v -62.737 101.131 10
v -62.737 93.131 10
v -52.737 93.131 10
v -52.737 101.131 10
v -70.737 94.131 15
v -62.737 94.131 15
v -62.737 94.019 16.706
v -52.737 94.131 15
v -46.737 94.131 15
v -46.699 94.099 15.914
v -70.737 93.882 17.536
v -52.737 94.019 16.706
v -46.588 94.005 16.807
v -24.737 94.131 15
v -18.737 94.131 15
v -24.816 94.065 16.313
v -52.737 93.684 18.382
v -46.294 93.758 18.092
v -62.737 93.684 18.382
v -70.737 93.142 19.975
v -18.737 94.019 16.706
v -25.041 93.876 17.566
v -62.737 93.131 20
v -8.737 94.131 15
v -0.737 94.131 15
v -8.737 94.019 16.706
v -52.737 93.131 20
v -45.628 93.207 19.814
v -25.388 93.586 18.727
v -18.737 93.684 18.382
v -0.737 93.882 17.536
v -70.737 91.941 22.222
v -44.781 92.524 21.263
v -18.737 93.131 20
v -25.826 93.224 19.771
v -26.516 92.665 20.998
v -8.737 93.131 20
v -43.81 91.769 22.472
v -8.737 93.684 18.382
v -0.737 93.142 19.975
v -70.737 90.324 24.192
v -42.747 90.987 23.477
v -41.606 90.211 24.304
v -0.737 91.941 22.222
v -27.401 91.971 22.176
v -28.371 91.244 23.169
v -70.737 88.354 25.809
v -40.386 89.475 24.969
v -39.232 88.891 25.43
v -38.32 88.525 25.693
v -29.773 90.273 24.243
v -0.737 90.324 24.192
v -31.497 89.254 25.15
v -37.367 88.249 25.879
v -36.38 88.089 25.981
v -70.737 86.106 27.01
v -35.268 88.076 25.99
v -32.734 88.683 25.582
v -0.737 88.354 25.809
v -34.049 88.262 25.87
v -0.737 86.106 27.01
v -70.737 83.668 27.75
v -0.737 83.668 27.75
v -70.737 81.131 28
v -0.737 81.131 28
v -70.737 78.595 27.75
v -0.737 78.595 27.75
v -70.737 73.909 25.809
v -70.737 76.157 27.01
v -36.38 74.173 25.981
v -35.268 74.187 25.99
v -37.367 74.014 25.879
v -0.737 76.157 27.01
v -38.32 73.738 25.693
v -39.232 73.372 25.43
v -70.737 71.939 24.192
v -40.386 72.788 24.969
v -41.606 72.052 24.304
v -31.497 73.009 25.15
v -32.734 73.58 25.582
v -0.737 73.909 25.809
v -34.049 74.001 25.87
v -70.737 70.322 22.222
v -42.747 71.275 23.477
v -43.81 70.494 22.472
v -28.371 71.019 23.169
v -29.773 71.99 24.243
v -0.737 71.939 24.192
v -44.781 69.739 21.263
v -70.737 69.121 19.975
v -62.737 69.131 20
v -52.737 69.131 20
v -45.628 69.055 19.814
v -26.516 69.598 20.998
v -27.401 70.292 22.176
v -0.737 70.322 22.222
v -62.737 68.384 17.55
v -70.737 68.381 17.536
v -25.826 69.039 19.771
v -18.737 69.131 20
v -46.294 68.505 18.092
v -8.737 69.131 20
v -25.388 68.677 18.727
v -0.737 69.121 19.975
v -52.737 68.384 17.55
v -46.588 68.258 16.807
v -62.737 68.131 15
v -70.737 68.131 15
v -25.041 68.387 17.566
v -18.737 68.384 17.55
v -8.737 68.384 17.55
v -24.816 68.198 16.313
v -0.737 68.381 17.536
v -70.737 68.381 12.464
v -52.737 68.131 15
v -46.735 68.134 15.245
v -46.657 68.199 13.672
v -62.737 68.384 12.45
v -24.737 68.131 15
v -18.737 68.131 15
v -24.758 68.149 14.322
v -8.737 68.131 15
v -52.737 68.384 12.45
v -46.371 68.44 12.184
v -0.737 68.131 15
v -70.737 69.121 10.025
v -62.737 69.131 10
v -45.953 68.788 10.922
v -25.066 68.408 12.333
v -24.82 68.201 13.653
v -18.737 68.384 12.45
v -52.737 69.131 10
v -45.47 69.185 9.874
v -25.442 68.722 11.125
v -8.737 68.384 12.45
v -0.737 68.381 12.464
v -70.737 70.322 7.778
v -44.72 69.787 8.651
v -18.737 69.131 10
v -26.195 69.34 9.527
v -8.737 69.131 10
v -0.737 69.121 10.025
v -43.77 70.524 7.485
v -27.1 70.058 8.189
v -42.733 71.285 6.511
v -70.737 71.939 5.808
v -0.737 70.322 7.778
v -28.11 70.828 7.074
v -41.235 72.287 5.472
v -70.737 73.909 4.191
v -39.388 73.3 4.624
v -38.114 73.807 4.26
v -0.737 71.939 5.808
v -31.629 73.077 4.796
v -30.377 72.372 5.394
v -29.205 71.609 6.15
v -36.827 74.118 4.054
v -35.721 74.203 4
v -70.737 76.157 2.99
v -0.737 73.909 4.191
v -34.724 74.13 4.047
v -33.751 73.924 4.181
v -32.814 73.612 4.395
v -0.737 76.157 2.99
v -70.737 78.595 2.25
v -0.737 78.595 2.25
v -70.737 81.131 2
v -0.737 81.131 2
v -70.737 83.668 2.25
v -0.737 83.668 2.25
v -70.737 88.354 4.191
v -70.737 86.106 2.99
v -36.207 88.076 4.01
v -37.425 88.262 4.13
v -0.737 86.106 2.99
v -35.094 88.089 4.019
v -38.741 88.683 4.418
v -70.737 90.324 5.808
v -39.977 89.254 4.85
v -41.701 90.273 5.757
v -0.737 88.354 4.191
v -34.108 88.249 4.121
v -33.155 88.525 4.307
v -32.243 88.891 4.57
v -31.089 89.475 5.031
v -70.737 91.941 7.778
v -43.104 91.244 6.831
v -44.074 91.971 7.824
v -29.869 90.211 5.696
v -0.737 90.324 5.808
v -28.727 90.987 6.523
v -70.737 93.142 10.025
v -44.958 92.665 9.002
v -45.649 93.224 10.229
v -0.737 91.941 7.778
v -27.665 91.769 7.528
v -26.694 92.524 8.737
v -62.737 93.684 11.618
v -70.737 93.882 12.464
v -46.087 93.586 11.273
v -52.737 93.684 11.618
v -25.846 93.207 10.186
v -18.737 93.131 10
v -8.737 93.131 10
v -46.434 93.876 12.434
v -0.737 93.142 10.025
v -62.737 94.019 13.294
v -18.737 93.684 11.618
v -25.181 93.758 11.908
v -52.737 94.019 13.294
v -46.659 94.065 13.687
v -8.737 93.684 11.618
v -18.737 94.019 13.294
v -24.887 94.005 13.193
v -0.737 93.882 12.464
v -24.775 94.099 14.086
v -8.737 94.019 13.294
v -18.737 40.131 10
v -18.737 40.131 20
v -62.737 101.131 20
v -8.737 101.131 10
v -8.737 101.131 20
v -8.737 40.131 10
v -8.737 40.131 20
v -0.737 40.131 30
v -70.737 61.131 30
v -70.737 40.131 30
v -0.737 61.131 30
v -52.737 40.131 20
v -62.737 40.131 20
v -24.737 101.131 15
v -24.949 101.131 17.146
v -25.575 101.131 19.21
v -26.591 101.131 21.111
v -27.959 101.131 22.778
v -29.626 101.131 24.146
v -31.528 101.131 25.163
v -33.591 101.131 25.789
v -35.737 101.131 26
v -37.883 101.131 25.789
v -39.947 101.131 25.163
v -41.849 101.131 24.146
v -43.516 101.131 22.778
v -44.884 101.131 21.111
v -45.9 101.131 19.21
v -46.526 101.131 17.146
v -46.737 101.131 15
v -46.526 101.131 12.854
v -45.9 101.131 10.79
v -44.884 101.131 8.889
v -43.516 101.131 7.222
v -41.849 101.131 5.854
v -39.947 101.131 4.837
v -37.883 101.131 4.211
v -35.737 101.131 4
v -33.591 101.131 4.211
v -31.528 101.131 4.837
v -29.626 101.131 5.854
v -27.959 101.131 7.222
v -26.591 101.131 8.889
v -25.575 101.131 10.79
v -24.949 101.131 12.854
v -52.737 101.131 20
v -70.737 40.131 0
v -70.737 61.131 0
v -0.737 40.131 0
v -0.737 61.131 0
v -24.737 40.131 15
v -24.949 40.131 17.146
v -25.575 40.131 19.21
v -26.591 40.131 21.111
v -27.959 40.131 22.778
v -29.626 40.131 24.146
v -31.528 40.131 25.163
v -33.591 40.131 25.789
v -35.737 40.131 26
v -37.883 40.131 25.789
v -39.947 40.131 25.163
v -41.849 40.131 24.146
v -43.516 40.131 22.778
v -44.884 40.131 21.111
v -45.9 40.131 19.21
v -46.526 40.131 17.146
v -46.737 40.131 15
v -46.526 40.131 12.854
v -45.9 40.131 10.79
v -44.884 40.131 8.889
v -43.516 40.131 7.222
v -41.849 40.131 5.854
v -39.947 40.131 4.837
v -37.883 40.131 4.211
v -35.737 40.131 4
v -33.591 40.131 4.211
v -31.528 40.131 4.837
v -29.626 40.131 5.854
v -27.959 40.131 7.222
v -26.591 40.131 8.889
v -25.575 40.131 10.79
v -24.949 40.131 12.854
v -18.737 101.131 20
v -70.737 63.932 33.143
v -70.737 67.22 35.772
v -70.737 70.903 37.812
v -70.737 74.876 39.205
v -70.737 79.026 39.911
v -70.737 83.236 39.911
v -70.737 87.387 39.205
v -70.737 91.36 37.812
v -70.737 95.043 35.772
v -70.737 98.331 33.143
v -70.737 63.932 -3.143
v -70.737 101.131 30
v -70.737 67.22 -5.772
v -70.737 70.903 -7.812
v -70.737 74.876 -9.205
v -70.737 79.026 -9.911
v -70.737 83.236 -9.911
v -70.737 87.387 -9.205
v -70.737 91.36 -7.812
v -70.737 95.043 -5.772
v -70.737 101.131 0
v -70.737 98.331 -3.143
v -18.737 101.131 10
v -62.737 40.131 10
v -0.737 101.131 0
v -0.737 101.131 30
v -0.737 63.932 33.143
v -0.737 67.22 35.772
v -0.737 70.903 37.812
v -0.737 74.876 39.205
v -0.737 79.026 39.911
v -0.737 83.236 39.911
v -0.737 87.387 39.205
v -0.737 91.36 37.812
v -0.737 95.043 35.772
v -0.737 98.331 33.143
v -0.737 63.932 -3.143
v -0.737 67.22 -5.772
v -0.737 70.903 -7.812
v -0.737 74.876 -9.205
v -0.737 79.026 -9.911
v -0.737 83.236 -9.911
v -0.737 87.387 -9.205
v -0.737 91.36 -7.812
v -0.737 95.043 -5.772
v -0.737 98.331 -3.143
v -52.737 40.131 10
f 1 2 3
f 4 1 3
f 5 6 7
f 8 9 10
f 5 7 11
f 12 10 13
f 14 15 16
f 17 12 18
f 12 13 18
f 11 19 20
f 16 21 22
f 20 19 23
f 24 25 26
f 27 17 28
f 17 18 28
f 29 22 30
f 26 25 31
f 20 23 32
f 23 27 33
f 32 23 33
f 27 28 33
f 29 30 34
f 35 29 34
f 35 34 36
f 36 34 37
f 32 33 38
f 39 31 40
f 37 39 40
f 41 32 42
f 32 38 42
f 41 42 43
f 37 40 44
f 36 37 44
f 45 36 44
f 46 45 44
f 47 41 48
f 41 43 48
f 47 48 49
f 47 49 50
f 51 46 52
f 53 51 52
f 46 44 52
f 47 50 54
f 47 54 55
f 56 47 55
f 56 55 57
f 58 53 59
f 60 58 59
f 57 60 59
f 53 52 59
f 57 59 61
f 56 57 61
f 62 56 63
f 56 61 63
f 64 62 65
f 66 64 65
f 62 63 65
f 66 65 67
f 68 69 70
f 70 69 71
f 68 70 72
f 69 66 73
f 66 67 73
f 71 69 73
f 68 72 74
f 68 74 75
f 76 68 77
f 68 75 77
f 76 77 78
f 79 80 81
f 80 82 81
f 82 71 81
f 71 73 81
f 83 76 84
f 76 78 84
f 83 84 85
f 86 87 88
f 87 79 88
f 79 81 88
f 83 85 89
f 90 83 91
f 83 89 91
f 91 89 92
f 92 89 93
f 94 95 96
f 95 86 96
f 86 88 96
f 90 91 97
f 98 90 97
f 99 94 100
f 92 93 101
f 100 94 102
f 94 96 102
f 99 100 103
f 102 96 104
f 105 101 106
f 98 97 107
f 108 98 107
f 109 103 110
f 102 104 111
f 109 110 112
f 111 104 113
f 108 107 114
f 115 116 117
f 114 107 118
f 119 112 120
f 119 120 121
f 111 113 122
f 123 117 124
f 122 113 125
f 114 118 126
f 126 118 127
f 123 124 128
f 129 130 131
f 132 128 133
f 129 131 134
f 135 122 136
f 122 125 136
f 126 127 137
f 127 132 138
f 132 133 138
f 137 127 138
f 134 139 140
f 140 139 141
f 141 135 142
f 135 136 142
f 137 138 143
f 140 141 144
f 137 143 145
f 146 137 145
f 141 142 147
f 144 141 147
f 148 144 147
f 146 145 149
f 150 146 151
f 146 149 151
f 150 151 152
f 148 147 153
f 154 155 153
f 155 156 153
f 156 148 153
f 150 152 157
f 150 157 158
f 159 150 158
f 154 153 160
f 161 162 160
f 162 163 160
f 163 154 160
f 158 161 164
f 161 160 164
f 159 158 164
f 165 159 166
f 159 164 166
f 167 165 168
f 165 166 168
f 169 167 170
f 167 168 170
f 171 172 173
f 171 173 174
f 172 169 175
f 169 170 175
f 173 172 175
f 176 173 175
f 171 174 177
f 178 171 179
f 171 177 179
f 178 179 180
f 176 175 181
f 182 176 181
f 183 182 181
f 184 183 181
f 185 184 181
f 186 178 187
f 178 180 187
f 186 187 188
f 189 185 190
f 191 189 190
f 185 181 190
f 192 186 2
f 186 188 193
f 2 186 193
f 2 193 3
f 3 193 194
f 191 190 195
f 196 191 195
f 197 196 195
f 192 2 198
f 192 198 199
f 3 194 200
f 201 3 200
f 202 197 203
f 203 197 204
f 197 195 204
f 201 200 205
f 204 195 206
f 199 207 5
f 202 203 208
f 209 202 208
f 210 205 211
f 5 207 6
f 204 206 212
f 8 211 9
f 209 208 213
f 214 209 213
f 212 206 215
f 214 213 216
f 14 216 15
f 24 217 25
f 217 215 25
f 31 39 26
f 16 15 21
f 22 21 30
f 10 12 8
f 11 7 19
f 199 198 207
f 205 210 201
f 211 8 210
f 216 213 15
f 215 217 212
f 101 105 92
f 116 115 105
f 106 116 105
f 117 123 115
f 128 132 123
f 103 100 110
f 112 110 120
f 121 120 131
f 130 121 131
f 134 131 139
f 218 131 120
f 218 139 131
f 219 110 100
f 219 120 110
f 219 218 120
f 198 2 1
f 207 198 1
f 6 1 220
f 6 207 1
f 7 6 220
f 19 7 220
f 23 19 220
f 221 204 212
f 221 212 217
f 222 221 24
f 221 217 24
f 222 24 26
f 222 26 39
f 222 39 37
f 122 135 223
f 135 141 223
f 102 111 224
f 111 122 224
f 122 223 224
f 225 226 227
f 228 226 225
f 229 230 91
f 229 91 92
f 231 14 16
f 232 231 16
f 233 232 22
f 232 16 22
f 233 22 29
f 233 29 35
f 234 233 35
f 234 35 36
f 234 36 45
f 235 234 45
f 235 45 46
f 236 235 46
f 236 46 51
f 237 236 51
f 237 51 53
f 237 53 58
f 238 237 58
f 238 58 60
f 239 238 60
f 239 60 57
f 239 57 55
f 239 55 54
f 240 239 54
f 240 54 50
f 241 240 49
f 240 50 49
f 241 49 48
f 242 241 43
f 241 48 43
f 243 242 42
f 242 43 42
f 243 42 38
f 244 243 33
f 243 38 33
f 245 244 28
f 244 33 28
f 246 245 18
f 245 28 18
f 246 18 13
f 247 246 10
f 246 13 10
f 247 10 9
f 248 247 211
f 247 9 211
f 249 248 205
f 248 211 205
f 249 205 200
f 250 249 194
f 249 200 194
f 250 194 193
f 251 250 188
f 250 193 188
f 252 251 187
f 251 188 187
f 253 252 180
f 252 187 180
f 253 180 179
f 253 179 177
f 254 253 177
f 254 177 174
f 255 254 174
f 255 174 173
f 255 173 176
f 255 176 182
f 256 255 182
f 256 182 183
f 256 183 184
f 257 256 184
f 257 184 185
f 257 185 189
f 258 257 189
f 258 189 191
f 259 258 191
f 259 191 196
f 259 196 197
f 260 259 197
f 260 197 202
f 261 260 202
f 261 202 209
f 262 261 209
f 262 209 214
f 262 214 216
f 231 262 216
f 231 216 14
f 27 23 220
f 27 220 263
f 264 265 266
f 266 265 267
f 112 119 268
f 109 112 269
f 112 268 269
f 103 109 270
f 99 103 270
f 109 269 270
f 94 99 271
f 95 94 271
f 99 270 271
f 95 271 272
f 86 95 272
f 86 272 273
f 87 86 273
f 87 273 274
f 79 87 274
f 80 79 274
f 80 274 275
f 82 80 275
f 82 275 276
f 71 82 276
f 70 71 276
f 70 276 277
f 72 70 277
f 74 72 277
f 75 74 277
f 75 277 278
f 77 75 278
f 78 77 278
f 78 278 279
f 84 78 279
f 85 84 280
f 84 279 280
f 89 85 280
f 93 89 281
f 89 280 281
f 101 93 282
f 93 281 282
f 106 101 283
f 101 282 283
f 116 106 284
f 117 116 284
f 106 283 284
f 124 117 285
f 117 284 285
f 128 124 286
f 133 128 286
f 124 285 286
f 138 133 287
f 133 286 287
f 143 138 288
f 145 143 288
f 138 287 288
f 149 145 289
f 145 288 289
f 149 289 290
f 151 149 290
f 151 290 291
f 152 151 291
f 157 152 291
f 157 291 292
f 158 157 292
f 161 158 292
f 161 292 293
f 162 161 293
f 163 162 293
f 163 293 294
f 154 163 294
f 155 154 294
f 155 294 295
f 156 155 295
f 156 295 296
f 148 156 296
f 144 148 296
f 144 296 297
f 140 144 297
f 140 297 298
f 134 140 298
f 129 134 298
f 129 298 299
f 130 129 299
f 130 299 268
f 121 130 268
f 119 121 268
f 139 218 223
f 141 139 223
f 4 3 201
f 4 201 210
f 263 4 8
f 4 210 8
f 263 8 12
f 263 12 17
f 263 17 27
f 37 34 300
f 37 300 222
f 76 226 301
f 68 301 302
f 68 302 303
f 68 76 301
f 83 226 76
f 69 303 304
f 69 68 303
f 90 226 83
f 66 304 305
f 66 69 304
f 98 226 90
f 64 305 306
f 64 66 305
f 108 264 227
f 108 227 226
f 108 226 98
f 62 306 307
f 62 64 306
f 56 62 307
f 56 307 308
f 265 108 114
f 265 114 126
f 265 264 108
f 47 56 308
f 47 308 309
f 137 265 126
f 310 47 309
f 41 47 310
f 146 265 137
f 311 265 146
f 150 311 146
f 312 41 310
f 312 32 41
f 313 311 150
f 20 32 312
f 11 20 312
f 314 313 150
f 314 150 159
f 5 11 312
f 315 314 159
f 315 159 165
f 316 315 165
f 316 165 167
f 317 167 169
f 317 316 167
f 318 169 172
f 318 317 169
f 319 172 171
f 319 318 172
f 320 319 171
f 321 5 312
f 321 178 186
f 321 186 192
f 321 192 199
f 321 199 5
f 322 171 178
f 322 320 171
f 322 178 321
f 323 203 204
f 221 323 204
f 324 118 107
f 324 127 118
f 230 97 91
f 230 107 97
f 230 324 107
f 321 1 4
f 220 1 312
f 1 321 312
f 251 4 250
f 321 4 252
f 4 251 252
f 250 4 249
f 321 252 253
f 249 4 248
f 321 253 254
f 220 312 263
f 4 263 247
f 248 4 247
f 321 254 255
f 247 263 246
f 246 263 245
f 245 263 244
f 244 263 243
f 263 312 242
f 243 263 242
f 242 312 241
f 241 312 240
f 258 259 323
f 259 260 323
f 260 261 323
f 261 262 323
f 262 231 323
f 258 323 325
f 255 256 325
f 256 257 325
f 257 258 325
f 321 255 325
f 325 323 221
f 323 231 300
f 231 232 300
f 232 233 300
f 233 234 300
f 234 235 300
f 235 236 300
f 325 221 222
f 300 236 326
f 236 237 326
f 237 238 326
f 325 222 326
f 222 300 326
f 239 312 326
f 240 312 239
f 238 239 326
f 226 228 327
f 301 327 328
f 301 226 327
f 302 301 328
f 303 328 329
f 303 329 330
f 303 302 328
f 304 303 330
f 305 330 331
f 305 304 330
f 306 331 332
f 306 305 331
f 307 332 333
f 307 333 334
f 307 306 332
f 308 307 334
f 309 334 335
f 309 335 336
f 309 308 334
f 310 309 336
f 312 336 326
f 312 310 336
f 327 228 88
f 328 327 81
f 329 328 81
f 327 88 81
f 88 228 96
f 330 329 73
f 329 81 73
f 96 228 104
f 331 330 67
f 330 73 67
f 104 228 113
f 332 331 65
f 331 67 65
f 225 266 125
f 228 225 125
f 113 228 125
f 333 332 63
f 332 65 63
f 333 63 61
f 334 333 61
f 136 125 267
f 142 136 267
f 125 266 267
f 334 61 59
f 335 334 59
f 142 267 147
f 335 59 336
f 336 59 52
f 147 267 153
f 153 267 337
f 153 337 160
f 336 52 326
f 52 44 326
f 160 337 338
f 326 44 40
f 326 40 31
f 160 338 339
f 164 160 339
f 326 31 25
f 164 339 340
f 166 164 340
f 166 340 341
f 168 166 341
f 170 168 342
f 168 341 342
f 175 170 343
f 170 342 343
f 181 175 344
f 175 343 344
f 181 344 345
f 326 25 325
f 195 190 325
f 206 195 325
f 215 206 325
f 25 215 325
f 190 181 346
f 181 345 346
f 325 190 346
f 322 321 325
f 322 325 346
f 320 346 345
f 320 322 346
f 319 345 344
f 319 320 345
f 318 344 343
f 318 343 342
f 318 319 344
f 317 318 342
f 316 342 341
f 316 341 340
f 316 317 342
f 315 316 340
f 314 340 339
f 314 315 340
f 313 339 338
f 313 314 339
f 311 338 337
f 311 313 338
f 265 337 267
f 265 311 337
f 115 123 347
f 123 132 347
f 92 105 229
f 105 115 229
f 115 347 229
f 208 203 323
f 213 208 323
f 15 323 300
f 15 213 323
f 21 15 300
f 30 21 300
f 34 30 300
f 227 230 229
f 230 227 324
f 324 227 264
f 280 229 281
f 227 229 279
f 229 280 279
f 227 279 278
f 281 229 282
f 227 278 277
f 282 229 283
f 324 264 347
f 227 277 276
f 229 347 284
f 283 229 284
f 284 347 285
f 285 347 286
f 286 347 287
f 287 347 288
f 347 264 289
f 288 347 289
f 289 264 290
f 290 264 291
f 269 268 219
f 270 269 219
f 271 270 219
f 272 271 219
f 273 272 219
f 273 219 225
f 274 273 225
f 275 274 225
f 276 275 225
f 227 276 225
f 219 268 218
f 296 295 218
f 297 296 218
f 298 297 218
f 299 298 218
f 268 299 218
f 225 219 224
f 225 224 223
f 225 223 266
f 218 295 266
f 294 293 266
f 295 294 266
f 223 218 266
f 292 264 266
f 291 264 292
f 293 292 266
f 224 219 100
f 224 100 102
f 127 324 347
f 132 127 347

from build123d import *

# Parameters (mm, degrees)
F0_W     = 70
F0_H     = 66
F1_DEPTH = 30
F3_DEPTH = 70
F4_DEPTH = 30
F6_D     = 26
F7_W     = 10
F7_H     = 10
F7_R     = 11
F8_DEPTH = 70


with BuildPart() as f1:
    # F0 (on Top) → F1 (new body)
    with BuildSketch(Plane.XY):
        with Locations((-35.7373842597, 73.1314720511)):
            Rectangle(F0_W, F0_H)
    extrude(amount=F1_DEPTH)

    # F2 (on face) → F3 (join)
    with BuildSketch(Plane(origin=(-70.7373842597, 0, 0), x_dir=(0, -1, 0), z_dir=(-1, 0, 0))):
        with BuildLine():
            Line((-101.1314720511, 30), (-61.1314720511, 30))
            ThreePointArc((-61.1314720511, 30), (-81.1314720511, 40), (-101.1314720511, 30))
        make_face()
        with BuildLine():
            ThreePointArc((-101.1314720511, 0), (-81.1314720511, -10), (-61.1314720511, 0))
            Line((-61.1314720511, 0), (-101.1314720511, 0))
        make_face()
    extrude(amount=-F3_DEPTH)

    # F4 (cut): a face of the model
    f4_faces = [f1.faces().sort_by_distance(p)[0] for p in [
        (-35.7373842597, 103.6314720511, 30),
    ]]
    extrude(f4_faces, amount=-F4_DEPTH, mode=Mode.SUBTRACT)

    # F6 (through all)
    with Locations(Plane(origin=(-70.7373842597, 0, 0), x_dir=(0, -1, 0), z_dir=(-1, 0, 0))):
        with Locations((-81.1314720511, 15)):
            Hole(F6_D / 2)

    # F7 (on face) → F8 (cut)
    with BuildSketch(Plane.XZ.offset(-40.1314720511)):
        with Locations((-57.7373842597, 15)):
            Rectangle(F7_W, F7_H)
        with Locations((-13.7373842597, 15)):
            Rectangle(F7_W, F7_H)
        with Locations((-35.7373842597, 15)):
            Circle(F7_R)
    extrude(amount=-F8_DEPTH, mode=Mode.SUBTRACT)


solid = f1.part
